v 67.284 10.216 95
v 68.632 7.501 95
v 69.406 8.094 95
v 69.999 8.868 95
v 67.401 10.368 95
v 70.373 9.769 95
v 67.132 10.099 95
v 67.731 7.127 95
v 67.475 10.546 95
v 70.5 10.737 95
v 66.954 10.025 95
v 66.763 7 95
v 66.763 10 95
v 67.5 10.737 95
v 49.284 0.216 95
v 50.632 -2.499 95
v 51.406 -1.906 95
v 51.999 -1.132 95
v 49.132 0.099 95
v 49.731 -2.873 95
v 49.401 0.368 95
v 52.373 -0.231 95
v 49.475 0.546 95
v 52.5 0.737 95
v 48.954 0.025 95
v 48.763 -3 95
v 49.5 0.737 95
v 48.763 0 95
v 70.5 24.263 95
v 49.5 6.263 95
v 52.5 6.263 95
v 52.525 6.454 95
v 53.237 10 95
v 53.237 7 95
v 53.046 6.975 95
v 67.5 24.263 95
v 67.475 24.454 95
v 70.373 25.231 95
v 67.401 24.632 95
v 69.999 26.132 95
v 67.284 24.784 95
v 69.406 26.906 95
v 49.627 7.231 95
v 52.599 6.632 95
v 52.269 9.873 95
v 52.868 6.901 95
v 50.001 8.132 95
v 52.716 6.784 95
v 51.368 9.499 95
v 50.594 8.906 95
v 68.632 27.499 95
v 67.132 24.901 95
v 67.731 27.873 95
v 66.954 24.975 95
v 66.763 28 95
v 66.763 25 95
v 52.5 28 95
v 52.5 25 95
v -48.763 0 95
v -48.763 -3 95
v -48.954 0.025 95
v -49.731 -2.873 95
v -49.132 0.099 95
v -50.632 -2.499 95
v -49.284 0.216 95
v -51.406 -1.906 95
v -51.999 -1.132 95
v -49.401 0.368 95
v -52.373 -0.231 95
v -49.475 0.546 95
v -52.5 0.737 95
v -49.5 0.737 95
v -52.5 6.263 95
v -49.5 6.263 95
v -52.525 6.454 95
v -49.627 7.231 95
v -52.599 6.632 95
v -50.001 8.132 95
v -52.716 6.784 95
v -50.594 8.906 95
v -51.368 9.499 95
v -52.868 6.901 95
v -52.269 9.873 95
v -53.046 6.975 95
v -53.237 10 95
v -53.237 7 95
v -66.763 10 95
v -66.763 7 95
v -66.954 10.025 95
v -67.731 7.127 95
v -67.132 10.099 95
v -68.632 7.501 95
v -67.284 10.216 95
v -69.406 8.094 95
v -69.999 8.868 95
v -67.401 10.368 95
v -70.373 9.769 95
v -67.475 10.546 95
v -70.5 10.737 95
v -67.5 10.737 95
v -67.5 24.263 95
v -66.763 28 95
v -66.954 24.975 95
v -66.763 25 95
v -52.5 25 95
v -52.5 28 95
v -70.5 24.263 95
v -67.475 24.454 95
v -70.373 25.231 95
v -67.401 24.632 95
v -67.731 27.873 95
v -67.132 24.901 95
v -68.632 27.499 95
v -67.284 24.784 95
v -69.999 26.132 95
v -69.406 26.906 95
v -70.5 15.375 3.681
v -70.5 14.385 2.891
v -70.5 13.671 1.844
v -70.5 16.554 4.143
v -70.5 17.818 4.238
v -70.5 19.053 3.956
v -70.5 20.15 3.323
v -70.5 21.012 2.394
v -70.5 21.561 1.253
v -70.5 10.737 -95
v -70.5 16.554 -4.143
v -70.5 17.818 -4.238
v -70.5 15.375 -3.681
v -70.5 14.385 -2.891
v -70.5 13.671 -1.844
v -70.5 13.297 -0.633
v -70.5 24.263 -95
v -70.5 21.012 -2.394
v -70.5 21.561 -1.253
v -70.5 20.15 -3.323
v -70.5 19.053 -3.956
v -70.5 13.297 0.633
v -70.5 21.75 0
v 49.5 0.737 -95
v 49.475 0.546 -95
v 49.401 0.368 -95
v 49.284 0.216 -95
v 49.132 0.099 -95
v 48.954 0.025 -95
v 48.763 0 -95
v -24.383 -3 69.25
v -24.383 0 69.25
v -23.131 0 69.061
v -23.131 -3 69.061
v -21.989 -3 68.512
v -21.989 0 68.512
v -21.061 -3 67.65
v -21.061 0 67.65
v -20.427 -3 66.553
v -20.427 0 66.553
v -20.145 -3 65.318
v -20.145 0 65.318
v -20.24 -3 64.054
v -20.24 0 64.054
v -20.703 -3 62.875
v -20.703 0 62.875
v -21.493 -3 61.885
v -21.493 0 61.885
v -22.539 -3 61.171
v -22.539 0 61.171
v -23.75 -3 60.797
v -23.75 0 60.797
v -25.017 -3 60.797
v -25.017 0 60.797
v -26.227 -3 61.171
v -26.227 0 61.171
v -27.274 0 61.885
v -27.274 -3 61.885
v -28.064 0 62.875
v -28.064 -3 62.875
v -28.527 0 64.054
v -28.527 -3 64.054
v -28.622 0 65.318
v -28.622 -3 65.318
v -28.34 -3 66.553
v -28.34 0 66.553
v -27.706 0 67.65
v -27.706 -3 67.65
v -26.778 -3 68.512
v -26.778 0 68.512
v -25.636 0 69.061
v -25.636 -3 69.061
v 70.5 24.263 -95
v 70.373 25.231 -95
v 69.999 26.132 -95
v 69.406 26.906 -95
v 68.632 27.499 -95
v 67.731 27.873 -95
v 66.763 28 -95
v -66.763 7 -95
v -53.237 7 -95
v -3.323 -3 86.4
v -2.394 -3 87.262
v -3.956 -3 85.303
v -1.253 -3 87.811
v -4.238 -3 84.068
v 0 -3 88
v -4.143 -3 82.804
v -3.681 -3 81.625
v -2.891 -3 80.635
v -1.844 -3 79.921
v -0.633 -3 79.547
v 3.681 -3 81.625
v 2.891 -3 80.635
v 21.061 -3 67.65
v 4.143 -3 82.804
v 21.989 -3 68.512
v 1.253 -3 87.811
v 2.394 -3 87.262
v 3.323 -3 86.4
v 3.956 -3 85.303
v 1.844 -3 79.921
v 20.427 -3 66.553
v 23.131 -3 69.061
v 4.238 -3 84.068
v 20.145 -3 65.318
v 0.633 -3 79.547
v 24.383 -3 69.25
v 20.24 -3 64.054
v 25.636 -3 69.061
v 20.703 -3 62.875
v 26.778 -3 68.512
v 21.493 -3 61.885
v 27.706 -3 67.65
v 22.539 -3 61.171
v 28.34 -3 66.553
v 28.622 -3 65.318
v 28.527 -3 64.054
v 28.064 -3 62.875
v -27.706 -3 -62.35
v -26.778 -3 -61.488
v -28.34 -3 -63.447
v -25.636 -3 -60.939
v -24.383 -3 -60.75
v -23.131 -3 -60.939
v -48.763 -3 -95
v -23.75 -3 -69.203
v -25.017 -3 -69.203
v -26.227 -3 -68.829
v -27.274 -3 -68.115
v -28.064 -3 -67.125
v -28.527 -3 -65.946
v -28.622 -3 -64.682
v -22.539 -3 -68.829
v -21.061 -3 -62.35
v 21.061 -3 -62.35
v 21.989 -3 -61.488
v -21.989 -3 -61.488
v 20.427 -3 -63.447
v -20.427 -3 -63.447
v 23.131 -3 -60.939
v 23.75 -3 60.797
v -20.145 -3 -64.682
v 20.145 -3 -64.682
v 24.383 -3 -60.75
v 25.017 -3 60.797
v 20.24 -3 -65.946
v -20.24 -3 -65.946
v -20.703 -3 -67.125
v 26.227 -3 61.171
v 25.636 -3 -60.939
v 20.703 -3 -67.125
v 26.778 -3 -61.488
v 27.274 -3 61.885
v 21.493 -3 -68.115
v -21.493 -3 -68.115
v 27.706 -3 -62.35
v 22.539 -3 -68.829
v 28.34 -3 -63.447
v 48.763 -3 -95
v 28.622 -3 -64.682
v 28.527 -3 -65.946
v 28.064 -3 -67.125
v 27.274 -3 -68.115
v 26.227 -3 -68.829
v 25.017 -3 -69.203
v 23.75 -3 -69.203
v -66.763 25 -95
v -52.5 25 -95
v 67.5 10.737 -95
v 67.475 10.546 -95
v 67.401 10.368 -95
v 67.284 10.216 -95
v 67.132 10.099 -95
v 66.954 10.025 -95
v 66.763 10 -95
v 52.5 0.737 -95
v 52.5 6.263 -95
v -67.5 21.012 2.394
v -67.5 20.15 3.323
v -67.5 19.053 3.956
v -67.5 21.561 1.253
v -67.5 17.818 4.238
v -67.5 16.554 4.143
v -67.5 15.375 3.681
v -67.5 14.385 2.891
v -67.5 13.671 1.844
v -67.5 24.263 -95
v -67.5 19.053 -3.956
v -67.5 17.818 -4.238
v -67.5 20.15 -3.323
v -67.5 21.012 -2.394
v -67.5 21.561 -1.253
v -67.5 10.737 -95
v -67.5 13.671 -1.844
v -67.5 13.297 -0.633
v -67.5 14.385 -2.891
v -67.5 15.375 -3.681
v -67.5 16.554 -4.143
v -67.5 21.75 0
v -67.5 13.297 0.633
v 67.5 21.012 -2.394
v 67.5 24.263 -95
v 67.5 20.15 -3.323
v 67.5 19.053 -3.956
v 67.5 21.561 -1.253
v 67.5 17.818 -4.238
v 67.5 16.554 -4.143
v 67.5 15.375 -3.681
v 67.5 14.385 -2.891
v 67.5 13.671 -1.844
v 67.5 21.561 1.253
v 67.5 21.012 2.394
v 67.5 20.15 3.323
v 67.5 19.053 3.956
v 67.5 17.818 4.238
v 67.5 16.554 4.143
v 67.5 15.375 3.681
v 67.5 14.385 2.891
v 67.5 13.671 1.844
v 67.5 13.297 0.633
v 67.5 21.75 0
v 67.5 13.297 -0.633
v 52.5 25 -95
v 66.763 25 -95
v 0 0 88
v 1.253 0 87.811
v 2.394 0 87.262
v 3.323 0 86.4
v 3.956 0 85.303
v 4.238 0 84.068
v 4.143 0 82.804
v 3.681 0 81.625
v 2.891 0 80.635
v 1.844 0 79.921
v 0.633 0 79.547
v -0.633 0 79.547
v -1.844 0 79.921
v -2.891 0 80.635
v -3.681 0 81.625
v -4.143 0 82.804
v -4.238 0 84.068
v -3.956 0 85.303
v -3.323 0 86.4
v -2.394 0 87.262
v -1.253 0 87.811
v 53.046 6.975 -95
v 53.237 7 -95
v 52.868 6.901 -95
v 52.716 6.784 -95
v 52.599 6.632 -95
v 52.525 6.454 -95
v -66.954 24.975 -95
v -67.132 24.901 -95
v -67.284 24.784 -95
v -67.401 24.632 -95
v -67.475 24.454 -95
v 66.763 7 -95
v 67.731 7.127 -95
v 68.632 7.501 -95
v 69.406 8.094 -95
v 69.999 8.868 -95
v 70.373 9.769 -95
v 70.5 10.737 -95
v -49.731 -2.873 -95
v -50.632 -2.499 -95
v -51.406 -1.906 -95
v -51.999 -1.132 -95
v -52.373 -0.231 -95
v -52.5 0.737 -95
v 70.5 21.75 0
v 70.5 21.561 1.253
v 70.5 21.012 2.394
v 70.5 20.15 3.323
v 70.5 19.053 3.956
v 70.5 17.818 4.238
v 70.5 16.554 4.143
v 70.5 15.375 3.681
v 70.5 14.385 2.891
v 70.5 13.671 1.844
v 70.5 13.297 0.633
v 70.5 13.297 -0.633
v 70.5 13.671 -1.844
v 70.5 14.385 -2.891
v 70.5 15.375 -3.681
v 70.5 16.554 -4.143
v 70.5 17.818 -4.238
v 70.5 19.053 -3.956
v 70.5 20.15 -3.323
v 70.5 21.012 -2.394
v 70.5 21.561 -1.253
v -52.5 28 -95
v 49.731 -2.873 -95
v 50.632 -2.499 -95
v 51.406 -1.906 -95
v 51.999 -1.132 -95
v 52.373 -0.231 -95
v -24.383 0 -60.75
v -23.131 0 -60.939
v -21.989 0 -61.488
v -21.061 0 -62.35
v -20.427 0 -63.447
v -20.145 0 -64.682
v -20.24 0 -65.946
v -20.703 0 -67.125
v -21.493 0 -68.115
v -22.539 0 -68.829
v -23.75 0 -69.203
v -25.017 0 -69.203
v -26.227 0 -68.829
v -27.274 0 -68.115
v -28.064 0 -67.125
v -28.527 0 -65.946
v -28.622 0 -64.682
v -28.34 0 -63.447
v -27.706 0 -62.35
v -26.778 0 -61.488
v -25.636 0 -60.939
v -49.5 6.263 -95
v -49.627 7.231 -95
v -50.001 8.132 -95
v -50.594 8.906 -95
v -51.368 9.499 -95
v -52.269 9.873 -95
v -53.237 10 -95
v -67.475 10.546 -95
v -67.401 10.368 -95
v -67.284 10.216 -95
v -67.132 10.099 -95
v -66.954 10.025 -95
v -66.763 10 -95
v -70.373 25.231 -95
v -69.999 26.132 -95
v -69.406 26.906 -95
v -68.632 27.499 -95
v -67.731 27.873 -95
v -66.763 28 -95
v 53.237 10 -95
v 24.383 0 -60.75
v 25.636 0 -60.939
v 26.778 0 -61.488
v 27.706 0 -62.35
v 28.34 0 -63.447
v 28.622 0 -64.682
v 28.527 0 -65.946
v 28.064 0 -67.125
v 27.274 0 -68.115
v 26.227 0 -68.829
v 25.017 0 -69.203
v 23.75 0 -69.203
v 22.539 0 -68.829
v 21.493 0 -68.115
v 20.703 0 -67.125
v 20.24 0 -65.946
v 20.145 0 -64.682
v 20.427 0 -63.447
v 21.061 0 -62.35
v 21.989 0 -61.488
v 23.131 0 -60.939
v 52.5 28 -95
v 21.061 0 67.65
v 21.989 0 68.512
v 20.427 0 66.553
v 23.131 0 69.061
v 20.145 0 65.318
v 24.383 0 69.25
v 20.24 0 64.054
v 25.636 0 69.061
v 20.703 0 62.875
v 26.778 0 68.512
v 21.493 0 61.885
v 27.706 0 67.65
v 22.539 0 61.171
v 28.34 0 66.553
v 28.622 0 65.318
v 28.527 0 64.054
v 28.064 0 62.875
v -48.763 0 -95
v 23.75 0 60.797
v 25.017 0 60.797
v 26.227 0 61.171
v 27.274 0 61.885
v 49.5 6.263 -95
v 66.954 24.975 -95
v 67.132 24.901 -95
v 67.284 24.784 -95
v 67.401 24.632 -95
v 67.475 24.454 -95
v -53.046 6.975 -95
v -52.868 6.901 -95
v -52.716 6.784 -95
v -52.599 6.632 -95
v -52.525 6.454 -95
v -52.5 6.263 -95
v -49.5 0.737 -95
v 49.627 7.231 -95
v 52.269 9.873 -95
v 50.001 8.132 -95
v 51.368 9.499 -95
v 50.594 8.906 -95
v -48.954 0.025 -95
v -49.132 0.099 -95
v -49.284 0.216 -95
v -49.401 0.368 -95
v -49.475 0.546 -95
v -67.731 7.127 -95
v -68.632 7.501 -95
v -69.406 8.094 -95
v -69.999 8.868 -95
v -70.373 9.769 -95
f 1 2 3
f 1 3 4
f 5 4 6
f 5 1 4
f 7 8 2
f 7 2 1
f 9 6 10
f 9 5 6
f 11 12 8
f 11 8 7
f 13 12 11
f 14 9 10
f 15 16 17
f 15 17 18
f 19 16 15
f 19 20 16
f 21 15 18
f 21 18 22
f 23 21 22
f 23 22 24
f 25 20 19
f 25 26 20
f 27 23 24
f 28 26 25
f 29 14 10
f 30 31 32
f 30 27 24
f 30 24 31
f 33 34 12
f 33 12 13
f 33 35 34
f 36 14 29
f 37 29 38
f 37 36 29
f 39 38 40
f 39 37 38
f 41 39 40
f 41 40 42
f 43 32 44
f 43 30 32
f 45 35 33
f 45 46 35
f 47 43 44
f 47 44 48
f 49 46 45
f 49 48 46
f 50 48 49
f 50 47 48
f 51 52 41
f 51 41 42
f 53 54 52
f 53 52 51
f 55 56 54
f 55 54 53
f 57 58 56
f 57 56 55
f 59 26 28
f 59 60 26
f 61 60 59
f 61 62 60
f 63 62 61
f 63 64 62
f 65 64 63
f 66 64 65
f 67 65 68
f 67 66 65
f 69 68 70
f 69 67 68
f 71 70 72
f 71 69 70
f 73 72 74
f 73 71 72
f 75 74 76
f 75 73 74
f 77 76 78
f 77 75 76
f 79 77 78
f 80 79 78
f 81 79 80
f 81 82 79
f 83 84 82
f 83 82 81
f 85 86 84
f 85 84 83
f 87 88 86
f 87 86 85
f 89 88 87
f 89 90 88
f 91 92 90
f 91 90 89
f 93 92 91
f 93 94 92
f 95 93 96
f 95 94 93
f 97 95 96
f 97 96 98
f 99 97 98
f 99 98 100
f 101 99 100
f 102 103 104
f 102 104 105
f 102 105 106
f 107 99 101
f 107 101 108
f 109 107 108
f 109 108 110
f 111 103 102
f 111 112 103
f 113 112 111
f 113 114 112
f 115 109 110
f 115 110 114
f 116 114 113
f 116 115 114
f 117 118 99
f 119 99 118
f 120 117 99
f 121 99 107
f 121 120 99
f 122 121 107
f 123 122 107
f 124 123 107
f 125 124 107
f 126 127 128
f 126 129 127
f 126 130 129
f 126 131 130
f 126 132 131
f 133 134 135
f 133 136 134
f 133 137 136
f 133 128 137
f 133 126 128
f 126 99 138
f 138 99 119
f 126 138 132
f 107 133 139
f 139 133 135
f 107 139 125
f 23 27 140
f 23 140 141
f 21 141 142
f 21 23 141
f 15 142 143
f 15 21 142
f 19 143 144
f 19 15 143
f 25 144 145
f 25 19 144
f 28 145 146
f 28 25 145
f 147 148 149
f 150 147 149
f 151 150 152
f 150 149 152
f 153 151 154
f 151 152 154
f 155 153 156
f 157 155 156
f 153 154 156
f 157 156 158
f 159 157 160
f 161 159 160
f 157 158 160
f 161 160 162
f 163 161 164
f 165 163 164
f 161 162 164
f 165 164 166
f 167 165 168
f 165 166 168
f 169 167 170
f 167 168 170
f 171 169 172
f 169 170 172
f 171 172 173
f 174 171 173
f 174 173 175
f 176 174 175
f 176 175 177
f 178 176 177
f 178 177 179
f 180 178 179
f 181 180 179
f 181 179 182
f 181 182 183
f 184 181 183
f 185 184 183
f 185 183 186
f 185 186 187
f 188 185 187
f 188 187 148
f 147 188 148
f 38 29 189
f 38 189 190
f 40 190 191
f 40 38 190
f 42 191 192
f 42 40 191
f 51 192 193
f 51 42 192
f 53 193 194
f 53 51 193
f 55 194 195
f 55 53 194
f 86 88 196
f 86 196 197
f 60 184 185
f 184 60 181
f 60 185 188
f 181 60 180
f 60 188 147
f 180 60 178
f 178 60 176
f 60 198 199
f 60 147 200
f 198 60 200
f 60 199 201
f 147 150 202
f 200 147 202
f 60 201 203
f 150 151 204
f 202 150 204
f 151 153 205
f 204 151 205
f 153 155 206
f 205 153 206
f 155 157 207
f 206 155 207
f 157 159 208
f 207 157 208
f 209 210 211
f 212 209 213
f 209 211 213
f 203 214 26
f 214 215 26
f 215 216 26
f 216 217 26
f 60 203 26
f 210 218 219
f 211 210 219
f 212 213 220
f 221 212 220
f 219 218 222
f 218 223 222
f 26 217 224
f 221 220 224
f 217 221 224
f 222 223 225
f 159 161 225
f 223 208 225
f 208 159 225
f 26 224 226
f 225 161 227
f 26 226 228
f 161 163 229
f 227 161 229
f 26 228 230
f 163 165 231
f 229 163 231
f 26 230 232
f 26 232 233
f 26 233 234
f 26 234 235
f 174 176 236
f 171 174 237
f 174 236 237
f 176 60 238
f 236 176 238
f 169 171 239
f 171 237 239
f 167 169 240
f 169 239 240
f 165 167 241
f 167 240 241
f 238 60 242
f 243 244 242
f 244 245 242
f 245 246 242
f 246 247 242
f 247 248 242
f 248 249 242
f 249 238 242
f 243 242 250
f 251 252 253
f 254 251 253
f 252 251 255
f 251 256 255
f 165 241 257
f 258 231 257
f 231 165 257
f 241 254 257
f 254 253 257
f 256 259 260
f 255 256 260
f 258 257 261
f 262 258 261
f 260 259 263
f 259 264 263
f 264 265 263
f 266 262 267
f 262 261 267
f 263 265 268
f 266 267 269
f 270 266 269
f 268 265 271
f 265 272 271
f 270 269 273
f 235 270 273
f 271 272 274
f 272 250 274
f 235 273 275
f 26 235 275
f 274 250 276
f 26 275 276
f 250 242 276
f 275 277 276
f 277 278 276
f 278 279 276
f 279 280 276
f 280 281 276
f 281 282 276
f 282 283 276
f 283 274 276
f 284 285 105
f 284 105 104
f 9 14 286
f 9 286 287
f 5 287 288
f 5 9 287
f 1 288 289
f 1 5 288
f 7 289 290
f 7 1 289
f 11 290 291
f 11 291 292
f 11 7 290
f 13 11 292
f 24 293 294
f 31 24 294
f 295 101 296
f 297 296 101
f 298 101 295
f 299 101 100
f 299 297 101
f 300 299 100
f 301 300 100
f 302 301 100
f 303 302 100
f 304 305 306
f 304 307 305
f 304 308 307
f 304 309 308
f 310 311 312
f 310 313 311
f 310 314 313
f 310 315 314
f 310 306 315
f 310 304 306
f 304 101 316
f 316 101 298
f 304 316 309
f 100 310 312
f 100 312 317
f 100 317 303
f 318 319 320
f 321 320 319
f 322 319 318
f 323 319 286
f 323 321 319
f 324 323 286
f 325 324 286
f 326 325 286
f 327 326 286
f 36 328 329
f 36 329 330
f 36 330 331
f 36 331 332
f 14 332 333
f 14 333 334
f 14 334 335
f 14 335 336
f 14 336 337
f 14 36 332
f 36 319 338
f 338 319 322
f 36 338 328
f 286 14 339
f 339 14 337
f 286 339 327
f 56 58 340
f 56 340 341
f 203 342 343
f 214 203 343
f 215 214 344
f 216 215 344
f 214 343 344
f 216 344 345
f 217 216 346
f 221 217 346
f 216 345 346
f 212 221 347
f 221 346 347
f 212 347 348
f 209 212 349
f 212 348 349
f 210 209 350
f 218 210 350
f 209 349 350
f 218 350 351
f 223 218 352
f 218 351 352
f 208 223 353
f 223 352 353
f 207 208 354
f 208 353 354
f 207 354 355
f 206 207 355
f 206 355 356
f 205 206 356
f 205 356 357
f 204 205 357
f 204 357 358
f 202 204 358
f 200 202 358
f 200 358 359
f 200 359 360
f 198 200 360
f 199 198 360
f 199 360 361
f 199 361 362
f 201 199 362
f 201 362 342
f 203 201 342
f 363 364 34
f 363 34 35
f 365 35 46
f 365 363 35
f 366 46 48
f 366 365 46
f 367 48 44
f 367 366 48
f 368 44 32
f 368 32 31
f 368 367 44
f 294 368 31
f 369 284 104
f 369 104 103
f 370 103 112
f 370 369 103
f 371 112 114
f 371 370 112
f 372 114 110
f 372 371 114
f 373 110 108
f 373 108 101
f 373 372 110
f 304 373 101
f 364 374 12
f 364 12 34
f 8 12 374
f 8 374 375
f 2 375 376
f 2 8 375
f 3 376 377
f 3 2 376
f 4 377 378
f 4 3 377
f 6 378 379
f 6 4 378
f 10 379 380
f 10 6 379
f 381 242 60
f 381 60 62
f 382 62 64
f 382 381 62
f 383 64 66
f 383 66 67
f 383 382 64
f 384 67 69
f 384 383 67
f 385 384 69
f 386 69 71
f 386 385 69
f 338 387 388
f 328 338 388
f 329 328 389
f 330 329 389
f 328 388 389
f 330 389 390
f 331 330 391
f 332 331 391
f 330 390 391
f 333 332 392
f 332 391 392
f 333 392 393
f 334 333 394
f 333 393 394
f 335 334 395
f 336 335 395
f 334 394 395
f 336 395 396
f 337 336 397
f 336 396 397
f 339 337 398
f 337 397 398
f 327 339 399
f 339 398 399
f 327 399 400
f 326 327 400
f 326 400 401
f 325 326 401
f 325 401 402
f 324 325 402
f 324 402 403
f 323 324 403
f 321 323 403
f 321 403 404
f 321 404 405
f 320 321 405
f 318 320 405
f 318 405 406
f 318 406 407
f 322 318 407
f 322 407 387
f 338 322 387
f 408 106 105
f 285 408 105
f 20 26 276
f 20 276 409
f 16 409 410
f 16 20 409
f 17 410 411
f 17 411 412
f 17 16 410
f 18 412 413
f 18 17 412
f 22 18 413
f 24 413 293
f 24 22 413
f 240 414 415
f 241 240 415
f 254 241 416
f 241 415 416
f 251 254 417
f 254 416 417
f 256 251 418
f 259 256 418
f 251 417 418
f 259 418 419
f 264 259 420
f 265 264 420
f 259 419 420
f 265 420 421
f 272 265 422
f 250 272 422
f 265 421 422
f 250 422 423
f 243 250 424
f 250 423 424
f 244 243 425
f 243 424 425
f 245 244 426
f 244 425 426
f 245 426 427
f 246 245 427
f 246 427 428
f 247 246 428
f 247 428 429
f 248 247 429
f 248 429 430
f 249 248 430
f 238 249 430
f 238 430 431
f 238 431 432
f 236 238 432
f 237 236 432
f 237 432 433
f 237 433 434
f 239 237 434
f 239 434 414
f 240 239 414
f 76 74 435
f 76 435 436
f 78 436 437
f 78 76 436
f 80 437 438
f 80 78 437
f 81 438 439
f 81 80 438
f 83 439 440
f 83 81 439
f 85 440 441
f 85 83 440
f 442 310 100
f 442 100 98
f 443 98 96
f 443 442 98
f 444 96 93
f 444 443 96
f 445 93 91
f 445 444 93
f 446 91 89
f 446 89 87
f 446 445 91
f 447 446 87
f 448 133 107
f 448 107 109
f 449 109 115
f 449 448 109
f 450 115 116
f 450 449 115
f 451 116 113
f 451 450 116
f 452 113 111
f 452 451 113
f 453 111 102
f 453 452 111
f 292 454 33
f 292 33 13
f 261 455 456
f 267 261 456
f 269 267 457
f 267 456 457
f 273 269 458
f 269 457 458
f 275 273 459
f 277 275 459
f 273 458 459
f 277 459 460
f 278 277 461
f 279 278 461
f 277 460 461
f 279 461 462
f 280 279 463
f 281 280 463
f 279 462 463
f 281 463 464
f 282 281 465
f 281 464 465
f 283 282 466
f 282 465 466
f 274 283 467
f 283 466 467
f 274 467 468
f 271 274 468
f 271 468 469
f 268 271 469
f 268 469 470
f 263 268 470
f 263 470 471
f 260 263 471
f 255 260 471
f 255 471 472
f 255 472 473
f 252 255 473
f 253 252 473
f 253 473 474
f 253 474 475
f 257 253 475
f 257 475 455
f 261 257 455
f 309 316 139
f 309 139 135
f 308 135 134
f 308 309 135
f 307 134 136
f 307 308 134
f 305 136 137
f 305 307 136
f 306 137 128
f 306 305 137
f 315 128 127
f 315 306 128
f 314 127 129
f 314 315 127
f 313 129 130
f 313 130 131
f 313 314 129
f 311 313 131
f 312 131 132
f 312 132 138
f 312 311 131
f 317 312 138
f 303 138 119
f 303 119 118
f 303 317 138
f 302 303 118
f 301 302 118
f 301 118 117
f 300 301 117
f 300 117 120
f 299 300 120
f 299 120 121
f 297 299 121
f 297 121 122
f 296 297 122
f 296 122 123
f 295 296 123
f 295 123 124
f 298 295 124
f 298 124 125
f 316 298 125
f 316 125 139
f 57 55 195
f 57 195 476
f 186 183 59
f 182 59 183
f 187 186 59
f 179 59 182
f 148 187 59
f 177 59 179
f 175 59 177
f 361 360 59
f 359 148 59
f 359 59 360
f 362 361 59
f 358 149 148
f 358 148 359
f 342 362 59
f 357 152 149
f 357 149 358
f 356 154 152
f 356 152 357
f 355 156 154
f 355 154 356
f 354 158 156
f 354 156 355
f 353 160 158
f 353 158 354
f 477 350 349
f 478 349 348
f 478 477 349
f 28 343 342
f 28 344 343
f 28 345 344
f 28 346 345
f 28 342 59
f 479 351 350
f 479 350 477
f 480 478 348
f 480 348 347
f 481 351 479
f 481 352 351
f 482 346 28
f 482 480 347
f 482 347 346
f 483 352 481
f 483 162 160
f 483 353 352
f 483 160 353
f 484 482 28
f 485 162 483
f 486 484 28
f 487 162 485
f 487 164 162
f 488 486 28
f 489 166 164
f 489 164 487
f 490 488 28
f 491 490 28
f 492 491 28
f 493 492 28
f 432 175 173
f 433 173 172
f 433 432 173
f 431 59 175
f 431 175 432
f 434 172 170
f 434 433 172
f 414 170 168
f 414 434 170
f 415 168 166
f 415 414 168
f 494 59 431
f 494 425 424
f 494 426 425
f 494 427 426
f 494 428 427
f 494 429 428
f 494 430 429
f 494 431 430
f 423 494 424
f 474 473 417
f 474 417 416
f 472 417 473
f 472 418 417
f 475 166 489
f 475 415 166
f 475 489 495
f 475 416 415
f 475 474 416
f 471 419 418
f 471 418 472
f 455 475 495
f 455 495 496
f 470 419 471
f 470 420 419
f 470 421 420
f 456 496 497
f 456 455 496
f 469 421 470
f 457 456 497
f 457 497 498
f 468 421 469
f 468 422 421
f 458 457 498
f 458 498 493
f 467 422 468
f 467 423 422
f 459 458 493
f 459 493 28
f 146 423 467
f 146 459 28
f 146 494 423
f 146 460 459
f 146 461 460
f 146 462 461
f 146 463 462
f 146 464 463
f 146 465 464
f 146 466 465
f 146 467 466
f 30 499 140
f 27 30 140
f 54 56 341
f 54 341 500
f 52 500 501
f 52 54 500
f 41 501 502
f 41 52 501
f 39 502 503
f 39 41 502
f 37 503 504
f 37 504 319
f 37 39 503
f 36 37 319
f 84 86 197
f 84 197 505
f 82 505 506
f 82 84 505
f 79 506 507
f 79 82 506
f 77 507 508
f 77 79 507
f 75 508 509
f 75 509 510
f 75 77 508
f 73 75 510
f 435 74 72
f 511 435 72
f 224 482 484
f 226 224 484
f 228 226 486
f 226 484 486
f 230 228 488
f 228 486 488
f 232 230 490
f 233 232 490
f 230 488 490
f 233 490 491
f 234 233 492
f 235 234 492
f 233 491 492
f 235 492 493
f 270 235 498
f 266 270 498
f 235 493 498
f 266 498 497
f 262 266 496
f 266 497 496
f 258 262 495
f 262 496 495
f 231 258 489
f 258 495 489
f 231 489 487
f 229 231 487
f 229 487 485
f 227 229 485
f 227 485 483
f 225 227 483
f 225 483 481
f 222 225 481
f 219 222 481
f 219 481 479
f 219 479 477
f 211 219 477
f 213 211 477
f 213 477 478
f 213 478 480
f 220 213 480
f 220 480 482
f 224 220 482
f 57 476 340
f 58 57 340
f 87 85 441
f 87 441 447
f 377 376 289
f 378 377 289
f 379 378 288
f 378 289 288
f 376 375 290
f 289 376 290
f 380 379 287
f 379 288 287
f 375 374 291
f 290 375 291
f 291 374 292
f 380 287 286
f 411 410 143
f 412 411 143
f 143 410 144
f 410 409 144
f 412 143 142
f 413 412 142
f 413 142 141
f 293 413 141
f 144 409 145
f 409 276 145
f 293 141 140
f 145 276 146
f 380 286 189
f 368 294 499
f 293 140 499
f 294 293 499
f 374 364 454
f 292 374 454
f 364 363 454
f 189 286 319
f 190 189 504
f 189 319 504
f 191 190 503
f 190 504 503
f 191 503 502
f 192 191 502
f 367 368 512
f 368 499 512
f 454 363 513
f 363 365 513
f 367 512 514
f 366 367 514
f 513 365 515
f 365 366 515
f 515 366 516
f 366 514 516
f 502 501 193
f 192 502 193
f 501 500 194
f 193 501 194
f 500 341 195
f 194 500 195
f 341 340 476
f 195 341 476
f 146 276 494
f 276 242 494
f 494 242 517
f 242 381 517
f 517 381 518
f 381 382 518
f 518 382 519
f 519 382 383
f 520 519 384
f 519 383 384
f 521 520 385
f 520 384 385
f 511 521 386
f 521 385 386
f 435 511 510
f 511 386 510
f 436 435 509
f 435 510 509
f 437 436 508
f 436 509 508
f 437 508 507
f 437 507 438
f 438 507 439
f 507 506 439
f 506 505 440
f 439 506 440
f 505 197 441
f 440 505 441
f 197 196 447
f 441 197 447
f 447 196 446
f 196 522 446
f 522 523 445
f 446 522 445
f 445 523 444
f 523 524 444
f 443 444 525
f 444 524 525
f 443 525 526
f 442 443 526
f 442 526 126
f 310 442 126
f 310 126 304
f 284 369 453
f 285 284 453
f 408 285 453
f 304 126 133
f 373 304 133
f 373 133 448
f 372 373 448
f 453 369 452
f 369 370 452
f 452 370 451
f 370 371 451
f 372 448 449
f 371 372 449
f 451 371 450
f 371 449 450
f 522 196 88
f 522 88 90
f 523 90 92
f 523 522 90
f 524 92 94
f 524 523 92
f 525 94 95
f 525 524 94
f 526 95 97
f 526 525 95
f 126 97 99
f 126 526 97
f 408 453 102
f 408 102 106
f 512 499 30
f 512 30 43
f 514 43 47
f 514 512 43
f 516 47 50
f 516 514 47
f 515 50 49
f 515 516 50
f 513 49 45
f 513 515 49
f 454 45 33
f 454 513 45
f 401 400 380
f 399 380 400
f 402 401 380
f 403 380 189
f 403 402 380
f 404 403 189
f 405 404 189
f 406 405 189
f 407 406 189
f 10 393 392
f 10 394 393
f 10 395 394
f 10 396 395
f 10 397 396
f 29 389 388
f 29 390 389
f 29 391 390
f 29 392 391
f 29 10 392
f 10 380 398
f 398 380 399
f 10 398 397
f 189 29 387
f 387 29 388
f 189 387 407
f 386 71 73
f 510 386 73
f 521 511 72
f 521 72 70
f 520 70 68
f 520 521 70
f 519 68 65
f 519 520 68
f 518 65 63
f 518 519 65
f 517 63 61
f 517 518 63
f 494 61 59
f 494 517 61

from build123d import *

# Parameters (mm, degrees)
SKETCH1_W                       = 105
SKETCH1_H                       = 190
BASE_FLANGE1_DEPTH              = 3
EDGE_FLANGE1_STRIP_W            = 13.4732
EDGE_FLANGE1_STRIP_H            = 3
EDGE_FLANGE1_STRIP_CUT_DEPTH    = 190
EDGE_FLANGE1_STRIP_2_W          = 13.4732
EDGE_FLANGE1_STRIP_2_H          = 3
EDGE_FLANGE1_STRIP_CUT_2_DEPTH  = 190
EDGE_FLANGE1_DEPTH              = 190
EDGE_FLANGE1_BEND_DEPTH         = 190
SKETCH33_R                      = 4.25
CUT_EXTRUDE1_DEPTH              = 10
EDGE_FLANGE8_STRIP_W            = 13.4732
EDGE_FLANGE8_STRIP_H            = 3
EDGE_FLANGE8_STRIP_CUT_DEPTH    = 190
EDGE_FLANGE8_STRIP_2_W          = 13.4732
EDGE_FLANGE8_STRIP_2_H          = 3
EDGE_FLANGE8_STRIP_CUT_2_DEPTH  = 190
EDGE_FLANGE8_DEPTH              = 190
EDGE_FLANGE8_BEND_DEPTH         = 190
EDGE_FLANGE9_STRIP_W            = 13.4732
EDGE_FLANGE9_STRIP_H            = 3
EDGE_FLANGE9_STRIP_CUT_DEPTH    = 190
EDGE_FLANGE9_STRIP_2_W          = 13.4732
EDGE_FLANGE9_STRIP_2_H          = 3
EDGE_FLANGE9_STRIP_CUT_2_DEPTH  = 190
EDGE_FLANGE9_DEPTH              = 190
EDGE_FLANGE9_BEND_DEPTH         = 190
EDGE_FLANGE10_STRIP_W           = 13.4732
EDGE_FLANGE10_STRIP_H           = 3
EDGE_FLANGE10_STRIP_CUT_DEPTH   = 190
EDGE_FLANGE10_STRIP_2_W         = 13.4732
EDGE_FLANGE10_STRIP_2_H         = 3
EDGE_FLANGE10_STRIP_CUT_2_DEPTH = 190
EDGE_FLANGE10_DEPTH             = 190
EDGE_FLANGE10_BEND_DEPTH        = 190
SKETCH72_R                      = 4.25
CUT_EXTRUDE4_DEPTH              = 10
CUT_EXTRUDE5_START              = -10
SKETCH77_R                      = 4.25
CUT_EXTRUDE5_DEPTH              = 10
SKETCH78_R                      = 4.25
CUT_EXTRUDE8_DEPTH              = 10


# Sheet-metal steps are written as plain solids
with BuildPart() as part:
    # Sketch1 → Base-Flange1 (new body)
    with BuildSketch(Plane(origin=(0, 0, 0), x_dir=(1, 0, 0), z_dir=(0, 1, 0))):
        Rectangle(SKETCH1_W, SKETCH1_H)
    extrude(amount=-BASE_FLANGE1_DEPTH)

    # Edge-Flange1 strip (across the edge) → Edge-Flange1 strip cut (cut)
    with BuildSketch(Plane(origin=(52.5, 0, 95), x_dir=(-1, 0, 0), z_dir=(0, 0, -1))):
        with Locations((-3, -1.5)):
            Rectangle(EDGE_FLANGE1_STRIP_W, EDGE_FLANGE1_STRIP_H)
    extrude(amount=EDGE_FLANGE1_STRIP_CUT_DEPTH, mode=Mode.SUBTRACT)

    # Edge-Flange1 strip 2 (across the edge) → Edge-Flange1 strip cut 2 (cut)
    with BuildSketch(Plane(origin=(-52.5, 0, -95), x_dir=(1, 0, 0), z_dir=(0, 0, 1))):
        with Locations((-3, -1.5)):
            Rectangle(EDGE_FLANGE1_STRIP_2_W, EDGE_FLANGE1_STRIP_2_H)
    extrude(amount=EDGE_FLANGE1_STRIP_CUT_2_DEPTH, mode=Mode.SUBTRACT)

    # Edge-Flange1 section (across the edge) → Edge-Flange1 (add)
    with BuildSketch(Plane(origin=(52.5, 0, 95), x_dir=(-1, 0, 0), z_dir=(0, 0, -1))):
        with BuildLine():
            Line((0, 0.7366), (0, 7))
            Line((0, 7), (3, 7))
            Line((3, 7), (3, 0.7366))
            ThreePointArc((3, 0.7366), (3.215745145, 0.215745145), (3.7366, 0))
            Line((3.7366, 0), (3.7366, -3))
            ThreePointArc((3.7366, -3), (1.094424801, -1.905575199), (0, 0.7366))
        make_face()
    extrude(amount=EDGE_FLANGE1_DEPTH)

    # Edge-Flange1 section 2 (across the edge) → Edge-Flange1 bend (add)
    with BuildSketch(Plane(origin=(-52.5, 0, -95), x_dir=(1, 0, 0), z_dir=(0, 0, 1))):
        with BuildLine():
            Line((0, 0.7366), (0, 7))
            Line((0, 7), (3, 7))
            Line((3, 7), (3, 0.7366))
            ThreePointArc((3, 0.7366), (3.215745145, 0.215745145), (3.7366, 0))
            Line((3.7366, 0), (3.7366, -3))
            ThreePointArc((3.7366, -3), (1.094424801, -1.905575199), (0, 0.7366))
        make_face()
    extrude(amount=EDGE_FLANGE1_BEND_DEPTH)

    # Sketch33 → Cut-Extrude1 (cut)
    with BuildSketch(Plane(origin=(0, 0, 0), x_dir=(1, 0, 0), z_dir=(0, 1, 0))):
        with Locations(Location((24.3834, -65, 0), (0, 0, 270))):
            Circle(SKETCH33_R)
        with Locations(Location((24.3834, 65, 0), (0, 0, 270))):
            Circle(SKETCH33_R)
        with Locations(Location((-24.3834, 65, 0), (0, 0, 270))):
            Circle(SKETCH33_R)
        with Locations(Location((-24.3834, -65, 0), (0, 0, 270))):
            Circle(SKETCH33_R)
    extrude(amount=-CUT_EXTRUDE1_DEPTH, mode=Mode.SUBTRACT)

    # Edge-Flange8 strip (across the edge) → Edge-Flange8 strip cut (cut)
    with BuildSketch(Plane(origin=(-52.5, 7, 95), x_dir=(0, -1, 0), z_dir=(0, 0, -1))):
        with Locations((-6, -1.5)):
            Rectangle(EDGE_FLANGE8_STRIP_W, EDGE_FLANGE8_STRIP_H)
    extrude(amount=EDGE_FLANGE8_STRIP_CUT_DEPTH, mode=Mode.SUBTRACT)

    # Edge-Flange8 strip 2 (across the edge) → Edge-Flange8 strip cut 2 (cut)
    with BuildSketch(Plane(origin=(52.5, 7, -95), x_dir=(0, -1, 0), z_dir=(0, 0, 1))):
        with Locations((-6, -1.5)):
            Rectangle(EDGE_FLANGE8_STRIP_2_W, EDGE_FLANGE8_STRIP_2_H)
    extrude(amount=EDGE_FLANGE8_STRIP_CUT_2_DEPTH, mode=Mode.SUBTRACT)

    # Edge-Flange8 section (across the edge) → Edge-Flange8 (add)
    with BuildSketch(Plane(origin=(-52.5, 7, 95), x_dir=(0, -1, 0), z_dir=(0, 0, -1))):
        with BuildLine():
            Line((-3, 0.7366), (-3, 15))
            Line((-3, 15), (0, 15))
            Line((0, 15), (0, 0.7366))
            ThreePointArc((0, 0.7366), (0.215745145, 0.215745145), (0.7366, 0))
            Line((0.7366, 0), (0.7366, -3))
            ThreePointArc((0.7366, -3), (-1.905575199, -1.905575199), (-3, 0.7366))
        make_face()
    extrude(amount=EDGE_FLANGE8_DEPTH)

    # Edge-Flange8 section 2 (across the edge) → Edge-Flange8 bend (add)
    with BuildSketch(Plane(origin=(52.5, 7, -95), x_dir=(0, -1, 0), z_dir=(0, 0, 1))):
        with BuildLine():
            Line((-3, 0.7366), (-3, 15))
            Line((-3, 15), (0, 15))
            Line((0, 15), (0, 0.7366))
            ThreePointArc((0, 0.7366), (0.215745145, 0.215745145), (0.7366, 0))
            Line((0.7366, 0), (0.7366, -3))
            ThreePointArc((0.7366, -3), (-1.905575199, -1.905575199), (-3, 0.7366))
        make_face()
    extrude(amount=EDGE_FLANGE8_BEND_DEPTH)

    # Edge-Flange9 strip (across the edge) → Edge-Flange9 strip cut (cut)
    with BuildSketch(Plane(origin=(-67.5, 10, -95), x_dir=(1, 0, 0), z_dir=(0, 0, 1))):
        with Locations((-6, -1.5)):
            Rectangle(EDGE_FLANGE9_STRIP_W, EDGE_FLANGE9_STRIP_H)
    extrude(amount=EDGE_FLANGE9_STRIP_CUT_DEPTH, mode=Mode.SUBTRACT)

    # Edge-Flange9 strip 2 (across the edge) → Edge-Flange9 strip cut 2 (cut)
    with BuildSketch(Plane(origin=(67.5, 10, 95), x_dir=(-1, 0, 0), z_dir=(0, 0, -1))):
        with Locations((-6, -1.5)):
            Rectangle(EDGE_FLANGE9_STRIP_2_W, EDGE_FLANGE9_STRIP_2_H)
    extrude(amount=EDGE_FLANGE9_STRIP_CUT_2_DEPTH, mode=Mode.SUBTRACT)

    # Edge-Flange9 section (across the edge) → Edge-Flange9 (add)
    with BuildSketch(Plane(origin=(-67.5, 10, -95), x_dir=(1, 0, 0), z_dir=(0, 0, 1))):
        with BuildLine():
            Line((-3, 0.7366), (-3, 15))
            Line((-3, 15), (0, 15))
            Line((0, 15), (0, 0.7366))
            ThreePointArc((0, 0.7366), (0.215745145, 0.215745145), (0.7366, 0))
            Line((0.7366, 0), (0.7366, -3))
            ThreePointArc((0.7366, -3), (-1.905575199, -1.905575199), (-3, 0.7366))
        make_face()
    extrude(amount=EDGE_FLANGE9_DEPTH)

    # Edge-Flange9 section 2 (across the edge) → Edge-Flange9 bend (add)
    with BuildSketch(Plane(origin=(67.5, 10, 95), x_dir=(-1, 0, 0), z_dir=(0, 0, -1))):
        with BuildLine():
            Line((-3, 0.7366), (-3, 15))
            Line((-3, 15), (0, 15))
            Line((0, 15), (0, 0.7366))
            ThreePointArc((0, 0.7366), (0.215745145, 0.215745145), (0.7366, 0))
            Line((0.7366, 0), (0.7366, -3))
            ThreePointArc((0.7366, -3), (-1.905575199, -1.905575199), (-3, 0.7366))
        make_face()
    extrude(amount=EDGE_FLANGE9_BEND_DEPTH)

    # Edge-Flange10 strip (across the edge) → Edge-Flange10 strip cut (cut)
    with BuildSketch(Plane(origin=(-67.5, 25, -95), x_dir=(0, -1, 0), z_dir=(0, 0, 1))):
        with Locations((-6, -1.5)):
            Rectangle(EDGE_FLANGE10_STRIP_W, EDGE_FLANGE10_STRIP_H)
    extrude(amount=EDGE_FLANGE10_STRIP_CUT_DEPTH, mode=Mode.SUBTRACT)

    # Edge-Flange10 strip 2 (across the edge) → Edge-Flange10 strip cut 2 (cut)
    with BuildSketch(Plane(origin=(67.5, 25, 95), x_dir=(0, -1, 0), z_dir=(0, 0, -1))):
        with Locations((-6, -1.5)):
            Rectangle(EDGE_FLANGE10_STRIP_2_W, EDGE_FLANGE10_STRIP_2_H)
    extrude(amount=EDGE_FLANGE10_STRIP_CUT_2_DEPTH, mode=Mode.SUBTRACT)

    # Edge-Flange10 section (across the edge) → Edge-Flange10 (add)
    with BuildSketch(Plane(origin=(-67.5, 25, -95), x_dir=(0, -1, 0), z_dir=(0, 0, 1))):
        with BuildLine():
            Line((-3, 0.7366), (-3, 15))
            Line((-3, 15), (0, 15))
            Line((0, 15), (0, 0.7366))
            ThreePointArc((0, 0.7366), (0.215745145, 0.215745145), (0.7366, 0))
            Line((0.7366, 0), (0.7366, -3))
            ThreePointArc((0.7366, -3), (-1.905575199, -1.905575199), (-3, 0.7366))
        make_face()
    extrude(amount=EDGE_FLANGE10_DEPTH)

    # Edge-Flange10 section 2 (across the edge) → Edge-Flange10 bend (add)
    with BuildSketch(Plane(origin=(67.5, 25, 95), x_dir=(0, -1, 0), z_dir=(0, 0, -1))):
        with BuildLine():
            Line((-3, 0.7366), (-3, 15))
            Line((-3, 15), (0, 15))
            Line((0, 15), (0, 0.7366))
            ThreePointArc((0, 0.7366), (0.215745145, 0.215745145), (0.7366, 0))
            Line((0.7366, 0), (0.7366, -3))
            ThreePointArc((0.7366, -3), (-1.905575199, -1.905575199), (-3, 0.7366))
        make_face()
    extrude(amount=EDGE_FLANGE10_BEND_DEPTH)

    # Sketch72 → Cut-Extrude4 (cut)
    with BuildSketch(Plane(origin=(70.5, 0, 0), x_dir=(0, 0, -1), z_dir=(1, 0, 0))):
        with Locations(Location((0, 17.5, 0), (0, 0, 90))):
            Circle(SKETCH72_R)
    extrude(amount=-CUT_EXTRUDE4_DEPTH, mode=Mode.SUBTRACT)

    # Sketch77 → Cut-Extrude5 (cut)
    with BuildSketch(Plane.ZY.offset(70.5).offset(CUT_EXTRUDE5_START)):
        with Locations(Location((0, 17.5, 0), (0, 0, 90))):
            Circle(SKETCH77_R)
    extrude(amount=CUT_EXTRUDE5_DEPTH, mode=Mode.SUBTRACT)

    # Sketch78 → Cut-Extrude8 (cut)
    with BuildSketch(Plane(origin=(0, 0, 0), x_dir=(1, 0, 0), z_dir=(0, 1, 0))):
        with Locations(Location((0, -83.75, 0), (0, 0, 270))):
            Circle(SKETCH78_R)
    extrude(amount=-CUT_EXTRUDE8_DEPTH, mode=Mode.SUBTRACT)


solid = part.part
